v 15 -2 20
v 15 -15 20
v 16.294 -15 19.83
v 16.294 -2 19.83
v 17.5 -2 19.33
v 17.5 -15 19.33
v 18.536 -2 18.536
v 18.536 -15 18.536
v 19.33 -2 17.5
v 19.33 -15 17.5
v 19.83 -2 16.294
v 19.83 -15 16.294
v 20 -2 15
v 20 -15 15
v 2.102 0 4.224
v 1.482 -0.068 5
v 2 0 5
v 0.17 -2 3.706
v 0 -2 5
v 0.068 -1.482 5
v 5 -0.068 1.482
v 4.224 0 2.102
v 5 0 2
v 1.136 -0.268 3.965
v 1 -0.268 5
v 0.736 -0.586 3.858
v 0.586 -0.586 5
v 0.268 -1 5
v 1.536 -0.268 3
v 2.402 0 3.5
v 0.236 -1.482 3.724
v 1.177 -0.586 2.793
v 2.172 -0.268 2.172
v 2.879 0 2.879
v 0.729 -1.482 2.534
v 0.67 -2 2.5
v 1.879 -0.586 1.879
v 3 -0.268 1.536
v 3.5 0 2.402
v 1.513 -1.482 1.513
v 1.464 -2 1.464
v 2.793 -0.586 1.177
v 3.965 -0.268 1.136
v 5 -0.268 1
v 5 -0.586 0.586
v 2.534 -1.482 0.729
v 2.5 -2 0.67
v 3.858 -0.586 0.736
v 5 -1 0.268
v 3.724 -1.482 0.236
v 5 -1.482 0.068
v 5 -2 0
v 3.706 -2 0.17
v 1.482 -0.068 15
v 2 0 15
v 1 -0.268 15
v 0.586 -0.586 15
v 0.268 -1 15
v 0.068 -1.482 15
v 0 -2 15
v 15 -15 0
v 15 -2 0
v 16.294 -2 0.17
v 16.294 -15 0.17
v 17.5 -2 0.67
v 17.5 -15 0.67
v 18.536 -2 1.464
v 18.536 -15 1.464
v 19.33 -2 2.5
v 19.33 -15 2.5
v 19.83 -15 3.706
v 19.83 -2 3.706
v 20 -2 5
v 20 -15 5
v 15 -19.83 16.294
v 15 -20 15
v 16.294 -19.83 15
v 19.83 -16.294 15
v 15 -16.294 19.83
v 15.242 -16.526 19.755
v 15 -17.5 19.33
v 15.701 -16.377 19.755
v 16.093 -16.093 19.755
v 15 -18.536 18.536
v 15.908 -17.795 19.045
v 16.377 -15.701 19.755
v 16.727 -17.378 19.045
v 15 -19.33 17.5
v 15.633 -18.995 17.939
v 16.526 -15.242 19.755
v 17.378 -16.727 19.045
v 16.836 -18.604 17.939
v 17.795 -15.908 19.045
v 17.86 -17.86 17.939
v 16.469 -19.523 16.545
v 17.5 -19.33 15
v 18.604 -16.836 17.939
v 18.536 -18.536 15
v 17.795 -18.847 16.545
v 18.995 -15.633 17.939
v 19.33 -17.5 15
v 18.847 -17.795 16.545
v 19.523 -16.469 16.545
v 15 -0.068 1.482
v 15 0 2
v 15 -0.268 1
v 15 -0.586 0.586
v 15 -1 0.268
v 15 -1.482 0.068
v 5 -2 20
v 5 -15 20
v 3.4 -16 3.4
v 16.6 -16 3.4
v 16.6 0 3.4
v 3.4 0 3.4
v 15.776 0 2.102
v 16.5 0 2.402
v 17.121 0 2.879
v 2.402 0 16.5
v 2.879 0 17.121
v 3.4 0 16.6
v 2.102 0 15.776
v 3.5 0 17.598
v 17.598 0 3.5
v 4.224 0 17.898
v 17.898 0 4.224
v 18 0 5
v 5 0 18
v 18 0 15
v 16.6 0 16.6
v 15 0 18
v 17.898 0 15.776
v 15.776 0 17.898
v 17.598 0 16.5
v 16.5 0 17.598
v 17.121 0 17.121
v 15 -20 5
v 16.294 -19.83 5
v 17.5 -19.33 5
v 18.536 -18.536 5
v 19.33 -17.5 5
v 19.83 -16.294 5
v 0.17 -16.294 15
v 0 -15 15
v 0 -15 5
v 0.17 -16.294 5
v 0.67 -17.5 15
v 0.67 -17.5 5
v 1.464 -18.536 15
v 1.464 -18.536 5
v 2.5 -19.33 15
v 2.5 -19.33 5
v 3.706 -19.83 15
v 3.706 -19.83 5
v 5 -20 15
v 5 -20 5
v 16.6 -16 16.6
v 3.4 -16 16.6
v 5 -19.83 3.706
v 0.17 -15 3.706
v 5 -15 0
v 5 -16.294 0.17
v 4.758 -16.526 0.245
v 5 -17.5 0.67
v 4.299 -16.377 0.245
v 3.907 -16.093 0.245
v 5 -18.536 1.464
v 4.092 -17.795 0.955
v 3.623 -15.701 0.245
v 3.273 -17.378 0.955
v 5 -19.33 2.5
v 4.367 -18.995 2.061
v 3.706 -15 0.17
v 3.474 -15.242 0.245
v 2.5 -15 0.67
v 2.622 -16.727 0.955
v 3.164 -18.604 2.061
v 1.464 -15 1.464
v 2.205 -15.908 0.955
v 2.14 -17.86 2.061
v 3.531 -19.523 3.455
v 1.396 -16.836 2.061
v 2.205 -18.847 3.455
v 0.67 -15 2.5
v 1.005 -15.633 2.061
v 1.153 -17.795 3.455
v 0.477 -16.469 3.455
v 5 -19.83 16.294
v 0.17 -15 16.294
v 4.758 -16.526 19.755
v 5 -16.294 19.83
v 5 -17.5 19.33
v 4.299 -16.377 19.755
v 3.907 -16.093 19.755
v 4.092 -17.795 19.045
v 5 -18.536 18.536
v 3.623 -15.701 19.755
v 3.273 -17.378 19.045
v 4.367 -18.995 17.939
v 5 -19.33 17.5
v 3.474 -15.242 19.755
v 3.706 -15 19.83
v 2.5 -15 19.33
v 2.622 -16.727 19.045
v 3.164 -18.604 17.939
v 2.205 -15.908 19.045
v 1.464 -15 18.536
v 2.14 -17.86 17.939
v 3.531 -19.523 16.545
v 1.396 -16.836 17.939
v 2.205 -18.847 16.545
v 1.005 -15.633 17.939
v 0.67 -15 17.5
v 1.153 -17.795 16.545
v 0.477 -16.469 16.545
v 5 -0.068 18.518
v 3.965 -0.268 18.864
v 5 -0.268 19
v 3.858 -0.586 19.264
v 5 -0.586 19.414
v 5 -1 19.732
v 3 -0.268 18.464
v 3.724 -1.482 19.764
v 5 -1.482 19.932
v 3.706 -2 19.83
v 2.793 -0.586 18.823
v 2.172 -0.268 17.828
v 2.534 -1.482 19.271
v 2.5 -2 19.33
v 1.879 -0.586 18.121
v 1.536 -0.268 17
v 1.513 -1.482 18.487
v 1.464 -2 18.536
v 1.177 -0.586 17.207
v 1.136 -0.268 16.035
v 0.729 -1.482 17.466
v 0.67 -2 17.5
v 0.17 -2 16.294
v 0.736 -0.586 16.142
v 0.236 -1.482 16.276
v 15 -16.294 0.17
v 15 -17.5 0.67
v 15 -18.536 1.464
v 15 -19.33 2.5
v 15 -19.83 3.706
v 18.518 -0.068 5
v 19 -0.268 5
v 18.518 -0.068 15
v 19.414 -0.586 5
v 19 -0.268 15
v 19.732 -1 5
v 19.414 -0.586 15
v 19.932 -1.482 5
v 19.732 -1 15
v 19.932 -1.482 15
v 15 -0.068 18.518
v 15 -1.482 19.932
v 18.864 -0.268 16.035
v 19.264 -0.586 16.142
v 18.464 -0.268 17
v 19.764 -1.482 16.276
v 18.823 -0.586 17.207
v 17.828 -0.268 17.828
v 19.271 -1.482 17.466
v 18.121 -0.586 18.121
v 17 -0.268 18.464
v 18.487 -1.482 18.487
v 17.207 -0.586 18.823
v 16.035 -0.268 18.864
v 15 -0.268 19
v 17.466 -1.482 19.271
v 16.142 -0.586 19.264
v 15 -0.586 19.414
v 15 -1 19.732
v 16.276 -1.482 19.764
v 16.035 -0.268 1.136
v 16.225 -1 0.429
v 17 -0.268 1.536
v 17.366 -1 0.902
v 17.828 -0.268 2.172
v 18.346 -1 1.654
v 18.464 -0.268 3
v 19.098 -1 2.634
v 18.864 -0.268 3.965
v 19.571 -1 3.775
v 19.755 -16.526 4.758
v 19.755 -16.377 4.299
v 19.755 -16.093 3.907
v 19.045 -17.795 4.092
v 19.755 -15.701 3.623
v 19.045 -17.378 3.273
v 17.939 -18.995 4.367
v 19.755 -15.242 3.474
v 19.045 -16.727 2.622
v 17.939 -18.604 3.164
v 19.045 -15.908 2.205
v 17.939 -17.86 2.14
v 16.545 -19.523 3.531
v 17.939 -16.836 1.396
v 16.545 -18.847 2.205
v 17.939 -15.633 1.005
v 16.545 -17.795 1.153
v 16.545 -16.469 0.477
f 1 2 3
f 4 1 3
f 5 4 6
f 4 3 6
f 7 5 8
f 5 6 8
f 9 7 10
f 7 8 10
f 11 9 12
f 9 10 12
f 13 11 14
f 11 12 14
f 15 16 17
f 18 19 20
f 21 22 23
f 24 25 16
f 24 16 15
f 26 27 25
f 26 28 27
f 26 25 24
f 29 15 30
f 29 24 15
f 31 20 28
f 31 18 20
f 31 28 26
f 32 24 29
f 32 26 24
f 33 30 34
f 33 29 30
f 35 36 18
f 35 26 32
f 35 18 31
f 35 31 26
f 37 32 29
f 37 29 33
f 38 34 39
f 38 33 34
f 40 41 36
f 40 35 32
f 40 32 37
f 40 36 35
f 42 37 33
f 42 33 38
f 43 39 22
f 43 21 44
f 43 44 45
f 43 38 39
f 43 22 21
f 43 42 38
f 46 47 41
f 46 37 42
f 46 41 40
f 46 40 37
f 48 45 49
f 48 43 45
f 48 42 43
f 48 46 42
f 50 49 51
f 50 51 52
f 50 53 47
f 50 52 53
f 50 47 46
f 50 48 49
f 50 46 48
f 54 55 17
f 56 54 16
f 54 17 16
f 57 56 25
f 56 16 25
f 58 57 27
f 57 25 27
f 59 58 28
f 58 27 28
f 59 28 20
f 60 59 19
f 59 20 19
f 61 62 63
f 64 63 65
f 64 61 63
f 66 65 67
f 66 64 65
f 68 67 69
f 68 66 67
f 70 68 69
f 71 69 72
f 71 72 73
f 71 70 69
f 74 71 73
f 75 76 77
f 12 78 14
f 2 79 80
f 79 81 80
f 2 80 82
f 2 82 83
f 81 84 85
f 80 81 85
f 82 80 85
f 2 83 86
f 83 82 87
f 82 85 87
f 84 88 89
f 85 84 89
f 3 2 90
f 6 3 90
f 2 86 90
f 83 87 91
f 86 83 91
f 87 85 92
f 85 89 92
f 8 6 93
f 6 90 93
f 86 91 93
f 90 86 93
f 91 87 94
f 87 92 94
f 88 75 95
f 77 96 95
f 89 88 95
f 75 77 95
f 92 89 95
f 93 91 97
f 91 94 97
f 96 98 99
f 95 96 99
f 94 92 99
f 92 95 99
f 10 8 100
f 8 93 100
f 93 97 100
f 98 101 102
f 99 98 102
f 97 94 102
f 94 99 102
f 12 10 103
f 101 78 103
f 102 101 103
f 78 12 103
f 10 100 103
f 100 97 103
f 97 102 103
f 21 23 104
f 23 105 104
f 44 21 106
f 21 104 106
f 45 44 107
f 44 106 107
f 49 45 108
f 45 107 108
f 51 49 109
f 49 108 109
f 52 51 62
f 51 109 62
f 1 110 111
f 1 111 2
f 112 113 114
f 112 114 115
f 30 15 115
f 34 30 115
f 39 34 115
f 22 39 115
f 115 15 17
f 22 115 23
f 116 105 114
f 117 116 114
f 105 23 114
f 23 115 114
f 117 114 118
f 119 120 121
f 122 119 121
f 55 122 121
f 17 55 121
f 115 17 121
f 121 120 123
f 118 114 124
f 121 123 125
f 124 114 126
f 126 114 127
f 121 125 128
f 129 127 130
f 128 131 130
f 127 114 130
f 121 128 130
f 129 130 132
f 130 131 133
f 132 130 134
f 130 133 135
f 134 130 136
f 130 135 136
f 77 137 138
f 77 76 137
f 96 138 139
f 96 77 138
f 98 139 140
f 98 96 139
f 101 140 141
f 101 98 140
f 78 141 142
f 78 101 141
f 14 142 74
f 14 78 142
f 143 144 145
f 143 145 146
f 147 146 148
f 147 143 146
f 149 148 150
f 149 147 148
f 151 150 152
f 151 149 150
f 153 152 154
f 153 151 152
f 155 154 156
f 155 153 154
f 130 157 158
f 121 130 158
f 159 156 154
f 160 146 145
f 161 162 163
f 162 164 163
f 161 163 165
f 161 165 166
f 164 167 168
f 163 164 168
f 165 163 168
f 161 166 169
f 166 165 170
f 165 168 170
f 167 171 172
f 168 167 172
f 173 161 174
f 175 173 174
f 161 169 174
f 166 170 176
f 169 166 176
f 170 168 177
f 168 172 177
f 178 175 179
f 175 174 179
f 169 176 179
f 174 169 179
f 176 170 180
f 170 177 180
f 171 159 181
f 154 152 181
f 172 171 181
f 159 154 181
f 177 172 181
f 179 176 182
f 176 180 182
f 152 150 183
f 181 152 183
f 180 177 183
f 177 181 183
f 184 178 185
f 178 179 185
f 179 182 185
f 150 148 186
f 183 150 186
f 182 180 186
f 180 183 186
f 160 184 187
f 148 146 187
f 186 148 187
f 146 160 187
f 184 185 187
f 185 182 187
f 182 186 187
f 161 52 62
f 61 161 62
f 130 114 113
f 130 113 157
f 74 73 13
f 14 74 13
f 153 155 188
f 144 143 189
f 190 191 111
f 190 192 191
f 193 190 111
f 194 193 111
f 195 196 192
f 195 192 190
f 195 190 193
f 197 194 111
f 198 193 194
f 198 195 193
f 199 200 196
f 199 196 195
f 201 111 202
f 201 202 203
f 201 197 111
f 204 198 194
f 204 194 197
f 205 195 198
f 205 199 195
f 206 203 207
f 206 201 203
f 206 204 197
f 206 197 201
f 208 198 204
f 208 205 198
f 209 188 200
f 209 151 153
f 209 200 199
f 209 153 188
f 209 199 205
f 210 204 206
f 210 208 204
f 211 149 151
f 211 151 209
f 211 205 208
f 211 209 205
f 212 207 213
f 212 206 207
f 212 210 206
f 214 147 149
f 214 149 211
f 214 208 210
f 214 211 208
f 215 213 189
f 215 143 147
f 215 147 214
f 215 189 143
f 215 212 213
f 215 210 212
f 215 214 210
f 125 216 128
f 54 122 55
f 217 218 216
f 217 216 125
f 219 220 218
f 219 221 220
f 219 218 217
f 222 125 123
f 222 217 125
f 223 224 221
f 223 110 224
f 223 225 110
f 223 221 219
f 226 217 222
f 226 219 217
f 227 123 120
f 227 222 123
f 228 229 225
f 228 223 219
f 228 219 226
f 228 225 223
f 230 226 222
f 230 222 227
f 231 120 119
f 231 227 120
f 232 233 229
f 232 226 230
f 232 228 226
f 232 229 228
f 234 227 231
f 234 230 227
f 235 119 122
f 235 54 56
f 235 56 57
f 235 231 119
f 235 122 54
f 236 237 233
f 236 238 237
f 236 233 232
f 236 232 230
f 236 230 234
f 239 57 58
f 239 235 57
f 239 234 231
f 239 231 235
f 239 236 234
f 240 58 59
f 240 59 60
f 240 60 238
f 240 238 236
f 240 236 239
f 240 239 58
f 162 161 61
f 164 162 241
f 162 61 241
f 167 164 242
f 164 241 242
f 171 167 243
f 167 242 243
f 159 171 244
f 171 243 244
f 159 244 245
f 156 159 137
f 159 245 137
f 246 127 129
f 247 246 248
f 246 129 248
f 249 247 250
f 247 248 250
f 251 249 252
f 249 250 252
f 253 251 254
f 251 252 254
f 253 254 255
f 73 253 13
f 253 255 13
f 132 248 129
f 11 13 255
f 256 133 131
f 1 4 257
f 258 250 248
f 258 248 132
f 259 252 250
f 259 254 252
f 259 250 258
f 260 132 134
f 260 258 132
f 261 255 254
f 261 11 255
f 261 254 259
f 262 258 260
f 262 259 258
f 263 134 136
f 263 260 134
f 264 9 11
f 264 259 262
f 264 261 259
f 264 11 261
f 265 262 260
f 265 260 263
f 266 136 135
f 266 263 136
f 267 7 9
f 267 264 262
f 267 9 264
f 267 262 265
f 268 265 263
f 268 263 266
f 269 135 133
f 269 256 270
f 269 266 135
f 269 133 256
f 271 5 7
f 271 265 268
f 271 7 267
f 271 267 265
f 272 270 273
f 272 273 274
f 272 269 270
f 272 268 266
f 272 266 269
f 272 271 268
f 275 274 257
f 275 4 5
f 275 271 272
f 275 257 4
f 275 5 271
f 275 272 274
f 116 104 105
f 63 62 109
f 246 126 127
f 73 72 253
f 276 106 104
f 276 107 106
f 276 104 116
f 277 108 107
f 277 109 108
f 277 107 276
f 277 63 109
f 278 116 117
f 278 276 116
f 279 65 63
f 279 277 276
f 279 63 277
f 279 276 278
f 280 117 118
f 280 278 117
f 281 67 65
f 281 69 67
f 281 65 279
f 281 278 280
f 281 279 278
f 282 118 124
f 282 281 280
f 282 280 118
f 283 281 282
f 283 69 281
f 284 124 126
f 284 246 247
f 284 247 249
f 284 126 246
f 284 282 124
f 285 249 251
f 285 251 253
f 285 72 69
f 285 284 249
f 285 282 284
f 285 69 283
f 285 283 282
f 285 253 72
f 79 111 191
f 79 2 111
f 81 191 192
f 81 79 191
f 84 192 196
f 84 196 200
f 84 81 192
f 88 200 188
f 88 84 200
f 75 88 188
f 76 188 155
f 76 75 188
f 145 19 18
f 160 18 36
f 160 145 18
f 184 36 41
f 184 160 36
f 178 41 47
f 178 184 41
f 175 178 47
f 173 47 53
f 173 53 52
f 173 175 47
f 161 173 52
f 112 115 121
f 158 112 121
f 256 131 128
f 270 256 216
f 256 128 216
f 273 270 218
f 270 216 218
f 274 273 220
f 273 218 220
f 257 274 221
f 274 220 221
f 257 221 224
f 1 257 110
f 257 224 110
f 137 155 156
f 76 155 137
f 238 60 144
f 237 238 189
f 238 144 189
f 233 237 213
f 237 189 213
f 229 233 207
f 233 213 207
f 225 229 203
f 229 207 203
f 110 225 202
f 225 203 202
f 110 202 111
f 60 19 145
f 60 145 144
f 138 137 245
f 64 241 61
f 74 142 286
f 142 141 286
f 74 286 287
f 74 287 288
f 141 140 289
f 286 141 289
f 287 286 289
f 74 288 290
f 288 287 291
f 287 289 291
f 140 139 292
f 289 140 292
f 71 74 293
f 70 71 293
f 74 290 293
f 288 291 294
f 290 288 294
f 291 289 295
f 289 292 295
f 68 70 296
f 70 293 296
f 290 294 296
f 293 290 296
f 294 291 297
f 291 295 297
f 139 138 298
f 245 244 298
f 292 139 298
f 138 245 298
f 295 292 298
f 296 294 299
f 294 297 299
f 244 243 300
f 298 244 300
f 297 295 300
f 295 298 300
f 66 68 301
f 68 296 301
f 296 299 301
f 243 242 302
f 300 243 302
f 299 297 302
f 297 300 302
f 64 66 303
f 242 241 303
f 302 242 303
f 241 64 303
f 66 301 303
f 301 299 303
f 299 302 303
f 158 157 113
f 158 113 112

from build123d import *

# Parameters (mm, degrees)
F0_W     = 20
F0_H     = 20
F1_DEPTH = 20
F2_W     = 13.2
F2_H     = 13.2
F3_DEPTH = 16
F4_R     = 5
F5_R     = 2


with BuildPart() as f1:
    # F0 (on Front) → F1 (new body)
    with BuildSketch(Plane.XZ):
        with Locations((10, 10)):
            Rectangle(F0_W, F0_H)
    extrude(amount=F1_DEPTH)

    # F2 (on face) → F3 (cut)
    with BuildSketch(Plane(origin=(0, 0, 0), x_dir=(-1, 0, 0), z_dir=(0, 1, 0))):
        with Locations((-10, 10)):
            Rectangle(F2_W, F2_H)
    extrude(amount=-F3_DEPTH, mode=Mode.SUBTRACT)

    # F4
    f4_edges = [f1.edges().sort_by_distance(p)[0] for p in [
        (0, -20, 10),
        (10, -20, 0),
        (20, -20, 10),
        (10, -20, 20),
        (20, -10, 20),
        (0, -10, 20),
        (20, -10, 0),
        (0, -10, 0),
    ]]
    fillet(f4_edges, radius=F4_R)

    # F5
    f5_edges = [f1.edges().sort_by_distance(p)[0] for p in [
        (18.535534, 0, 1.464466),
        (20, 0, 10),
        (18.535534, 0, 18.535534),
        (10, 0, 20),
        (1.464466, 0, 18.535534),
        (0, 0, 10),
        (1.464466, 0, 1.464466),
        (10, 0, 0),
    ]]
    fillet(f5_edges, radius=F5_R)


solid = f1.part
